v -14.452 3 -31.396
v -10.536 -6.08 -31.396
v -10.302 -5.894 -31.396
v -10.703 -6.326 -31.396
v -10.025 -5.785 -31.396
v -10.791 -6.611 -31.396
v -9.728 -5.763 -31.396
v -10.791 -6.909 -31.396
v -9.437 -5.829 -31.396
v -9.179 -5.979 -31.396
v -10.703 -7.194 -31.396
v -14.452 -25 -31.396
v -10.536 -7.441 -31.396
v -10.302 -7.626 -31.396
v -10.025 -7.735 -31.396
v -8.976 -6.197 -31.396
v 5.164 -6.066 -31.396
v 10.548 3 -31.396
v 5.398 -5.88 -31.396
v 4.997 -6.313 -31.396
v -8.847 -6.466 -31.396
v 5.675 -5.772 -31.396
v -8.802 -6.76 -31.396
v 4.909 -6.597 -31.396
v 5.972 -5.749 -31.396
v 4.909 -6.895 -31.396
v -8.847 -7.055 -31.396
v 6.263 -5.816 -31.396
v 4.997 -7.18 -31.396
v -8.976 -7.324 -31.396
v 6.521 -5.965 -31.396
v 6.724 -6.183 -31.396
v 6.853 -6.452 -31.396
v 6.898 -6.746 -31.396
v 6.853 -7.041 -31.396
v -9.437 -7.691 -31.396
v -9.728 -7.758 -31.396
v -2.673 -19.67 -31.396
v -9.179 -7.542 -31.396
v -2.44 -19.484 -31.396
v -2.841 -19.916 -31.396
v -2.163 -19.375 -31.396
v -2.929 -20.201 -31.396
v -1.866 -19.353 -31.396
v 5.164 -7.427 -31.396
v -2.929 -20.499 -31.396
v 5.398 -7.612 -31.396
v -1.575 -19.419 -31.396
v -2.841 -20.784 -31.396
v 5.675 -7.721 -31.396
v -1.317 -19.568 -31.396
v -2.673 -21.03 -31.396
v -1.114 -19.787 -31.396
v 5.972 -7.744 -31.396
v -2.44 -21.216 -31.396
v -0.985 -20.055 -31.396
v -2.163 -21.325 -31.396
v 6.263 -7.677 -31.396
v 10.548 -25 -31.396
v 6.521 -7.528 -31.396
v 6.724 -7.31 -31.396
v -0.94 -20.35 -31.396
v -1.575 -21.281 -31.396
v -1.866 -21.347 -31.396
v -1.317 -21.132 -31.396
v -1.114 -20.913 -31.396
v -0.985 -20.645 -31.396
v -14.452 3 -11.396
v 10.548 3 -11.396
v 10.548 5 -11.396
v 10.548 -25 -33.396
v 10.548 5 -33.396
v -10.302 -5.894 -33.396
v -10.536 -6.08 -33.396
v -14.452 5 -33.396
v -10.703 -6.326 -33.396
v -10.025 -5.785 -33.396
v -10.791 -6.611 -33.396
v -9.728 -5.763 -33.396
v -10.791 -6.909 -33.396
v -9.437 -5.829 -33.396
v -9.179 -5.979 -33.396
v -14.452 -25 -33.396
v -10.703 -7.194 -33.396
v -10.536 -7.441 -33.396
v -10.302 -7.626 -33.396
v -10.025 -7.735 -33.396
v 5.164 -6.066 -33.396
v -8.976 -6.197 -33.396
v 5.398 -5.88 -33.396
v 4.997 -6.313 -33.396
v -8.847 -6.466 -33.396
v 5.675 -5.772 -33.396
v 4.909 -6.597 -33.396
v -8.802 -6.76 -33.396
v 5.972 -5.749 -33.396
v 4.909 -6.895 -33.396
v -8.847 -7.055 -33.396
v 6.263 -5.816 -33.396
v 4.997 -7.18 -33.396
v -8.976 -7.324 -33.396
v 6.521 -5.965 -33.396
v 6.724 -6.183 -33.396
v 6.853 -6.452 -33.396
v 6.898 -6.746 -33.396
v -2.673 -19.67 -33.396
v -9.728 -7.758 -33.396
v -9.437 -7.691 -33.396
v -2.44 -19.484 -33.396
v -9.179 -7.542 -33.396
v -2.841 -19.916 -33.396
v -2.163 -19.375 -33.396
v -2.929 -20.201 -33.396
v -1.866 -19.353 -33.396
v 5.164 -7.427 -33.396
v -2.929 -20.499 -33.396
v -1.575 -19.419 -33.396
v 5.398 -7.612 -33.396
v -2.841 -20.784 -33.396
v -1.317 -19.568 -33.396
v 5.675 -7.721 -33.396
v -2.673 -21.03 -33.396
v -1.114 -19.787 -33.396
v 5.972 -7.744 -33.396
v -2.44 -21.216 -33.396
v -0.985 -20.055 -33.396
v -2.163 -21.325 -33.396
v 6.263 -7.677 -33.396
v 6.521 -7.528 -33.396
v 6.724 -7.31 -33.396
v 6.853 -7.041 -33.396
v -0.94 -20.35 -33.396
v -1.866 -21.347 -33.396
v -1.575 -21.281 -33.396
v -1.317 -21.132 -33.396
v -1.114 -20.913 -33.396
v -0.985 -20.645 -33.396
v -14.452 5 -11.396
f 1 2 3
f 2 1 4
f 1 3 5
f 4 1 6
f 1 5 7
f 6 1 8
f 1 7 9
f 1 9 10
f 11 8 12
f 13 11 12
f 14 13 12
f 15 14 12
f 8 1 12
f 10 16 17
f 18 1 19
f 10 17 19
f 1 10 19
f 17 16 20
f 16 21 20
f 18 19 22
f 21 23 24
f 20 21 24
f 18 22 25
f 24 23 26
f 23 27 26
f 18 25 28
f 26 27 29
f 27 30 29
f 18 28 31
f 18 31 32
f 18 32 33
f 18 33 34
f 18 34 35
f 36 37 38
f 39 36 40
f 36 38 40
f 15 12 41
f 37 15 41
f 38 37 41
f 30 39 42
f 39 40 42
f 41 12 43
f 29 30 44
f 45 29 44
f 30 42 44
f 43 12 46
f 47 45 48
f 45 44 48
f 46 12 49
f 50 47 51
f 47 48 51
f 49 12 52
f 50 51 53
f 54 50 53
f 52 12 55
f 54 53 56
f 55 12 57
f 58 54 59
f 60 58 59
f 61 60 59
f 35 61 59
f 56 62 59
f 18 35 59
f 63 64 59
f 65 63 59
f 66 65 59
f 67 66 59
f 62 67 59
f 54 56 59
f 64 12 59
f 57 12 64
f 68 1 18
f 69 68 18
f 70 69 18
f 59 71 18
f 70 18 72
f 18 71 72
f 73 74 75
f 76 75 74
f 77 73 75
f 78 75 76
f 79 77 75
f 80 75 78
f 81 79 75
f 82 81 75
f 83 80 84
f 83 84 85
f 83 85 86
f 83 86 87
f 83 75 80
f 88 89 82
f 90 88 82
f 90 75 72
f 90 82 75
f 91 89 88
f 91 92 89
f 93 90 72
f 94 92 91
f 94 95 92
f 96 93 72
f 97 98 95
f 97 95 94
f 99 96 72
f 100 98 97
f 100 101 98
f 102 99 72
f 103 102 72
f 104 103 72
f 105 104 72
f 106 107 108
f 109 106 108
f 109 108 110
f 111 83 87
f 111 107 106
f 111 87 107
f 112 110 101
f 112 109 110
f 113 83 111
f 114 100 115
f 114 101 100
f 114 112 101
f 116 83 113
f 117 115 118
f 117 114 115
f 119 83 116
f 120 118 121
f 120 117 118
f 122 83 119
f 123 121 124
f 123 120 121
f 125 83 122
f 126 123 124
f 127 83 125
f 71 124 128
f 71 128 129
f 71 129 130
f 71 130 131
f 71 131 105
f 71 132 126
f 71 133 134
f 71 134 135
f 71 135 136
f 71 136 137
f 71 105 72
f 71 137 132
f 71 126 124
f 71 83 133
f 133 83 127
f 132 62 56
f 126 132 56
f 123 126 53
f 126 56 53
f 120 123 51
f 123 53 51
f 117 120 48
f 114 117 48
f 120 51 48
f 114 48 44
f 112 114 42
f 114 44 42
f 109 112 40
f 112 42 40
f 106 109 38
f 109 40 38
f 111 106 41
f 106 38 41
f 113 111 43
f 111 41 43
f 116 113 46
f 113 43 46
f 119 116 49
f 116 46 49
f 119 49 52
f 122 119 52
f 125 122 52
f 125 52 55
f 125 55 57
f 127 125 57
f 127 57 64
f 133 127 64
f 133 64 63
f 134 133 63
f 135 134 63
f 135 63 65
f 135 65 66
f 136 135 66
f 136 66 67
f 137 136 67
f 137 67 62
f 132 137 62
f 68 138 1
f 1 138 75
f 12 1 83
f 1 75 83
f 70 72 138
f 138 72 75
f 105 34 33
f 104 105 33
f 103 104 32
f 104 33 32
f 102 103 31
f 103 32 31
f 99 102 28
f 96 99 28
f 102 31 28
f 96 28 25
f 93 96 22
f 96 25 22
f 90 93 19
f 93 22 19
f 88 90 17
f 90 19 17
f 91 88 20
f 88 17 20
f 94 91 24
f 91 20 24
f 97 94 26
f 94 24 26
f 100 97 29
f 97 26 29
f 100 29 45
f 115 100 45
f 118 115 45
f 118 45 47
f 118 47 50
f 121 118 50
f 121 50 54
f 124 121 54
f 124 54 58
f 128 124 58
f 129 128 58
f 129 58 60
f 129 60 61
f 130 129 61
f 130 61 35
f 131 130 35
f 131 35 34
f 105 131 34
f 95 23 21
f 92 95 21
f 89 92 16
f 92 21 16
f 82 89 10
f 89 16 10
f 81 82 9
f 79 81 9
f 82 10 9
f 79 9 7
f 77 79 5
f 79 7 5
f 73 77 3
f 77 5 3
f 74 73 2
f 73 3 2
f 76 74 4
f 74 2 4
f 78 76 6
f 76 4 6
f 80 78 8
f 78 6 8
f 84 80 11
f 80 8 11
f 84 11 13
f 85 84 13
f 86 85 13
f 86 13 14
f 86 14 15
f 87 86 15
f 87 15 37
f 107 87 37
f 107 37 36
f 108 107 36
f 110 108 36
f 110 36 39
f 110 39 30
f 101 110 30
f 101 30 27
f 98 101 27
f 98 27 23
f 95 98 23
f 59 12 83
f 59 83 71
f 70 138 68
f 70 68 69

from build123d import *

# Parameters (mm, degrees)
F0_W     = 25
F0_H     = 2
F1_DEPTH = 25
F2_R     = 1
F3_DEPTH = 25
F4_DEPTH = 5
F6_DEPTH = 20


with BuildPart() as f1:
    # F0 (on Front) → F1 (new body)
    with BuildSketch(Plane.XZ):
        with Locations((-1.9524786621, -32.3955392072)):
            Rectangle(F0_W, F0_H)
    extrude(amount=F1_DEPTH)

    # F2 (on face) → F3 (cut)
    with BuildSketch(Plane.XY.offset(-31.3955392072)):
        with Locations((-1.9404253719, -20.35)):
            Circle(F2_R)
        with Locations((5.8975151656, -6.7464457538)):
            Circle(F2_R)
        with Locations((-9.8024786621, -6.760367258)):
            Circle(F2_R)
    extrude(amount=-F3_DEPTH, mode=Mode.SUBTRACT)

    # F4 (add): a face of the model
    f4_faces = [f1.faces().sort_by_distance(p)[0] for p in [
        (-1.9524786621, 0, -32.3955392072),
    ]]
    extrude(f4_faces, amount=F4_DEPTH)

    # F5 (on face) → F6 (join)
    with BuildSketch(Plane.XY.offset(-31.3955392072)):
        Polygon((-14.4524786621, 5), (-14.4524786621, 3), (10.433112914, 3), (10.5475213379, 3), (10.5475213379, 5), align=None)
    extrude(amount=F6_DEPTH)


solid = f1.part
